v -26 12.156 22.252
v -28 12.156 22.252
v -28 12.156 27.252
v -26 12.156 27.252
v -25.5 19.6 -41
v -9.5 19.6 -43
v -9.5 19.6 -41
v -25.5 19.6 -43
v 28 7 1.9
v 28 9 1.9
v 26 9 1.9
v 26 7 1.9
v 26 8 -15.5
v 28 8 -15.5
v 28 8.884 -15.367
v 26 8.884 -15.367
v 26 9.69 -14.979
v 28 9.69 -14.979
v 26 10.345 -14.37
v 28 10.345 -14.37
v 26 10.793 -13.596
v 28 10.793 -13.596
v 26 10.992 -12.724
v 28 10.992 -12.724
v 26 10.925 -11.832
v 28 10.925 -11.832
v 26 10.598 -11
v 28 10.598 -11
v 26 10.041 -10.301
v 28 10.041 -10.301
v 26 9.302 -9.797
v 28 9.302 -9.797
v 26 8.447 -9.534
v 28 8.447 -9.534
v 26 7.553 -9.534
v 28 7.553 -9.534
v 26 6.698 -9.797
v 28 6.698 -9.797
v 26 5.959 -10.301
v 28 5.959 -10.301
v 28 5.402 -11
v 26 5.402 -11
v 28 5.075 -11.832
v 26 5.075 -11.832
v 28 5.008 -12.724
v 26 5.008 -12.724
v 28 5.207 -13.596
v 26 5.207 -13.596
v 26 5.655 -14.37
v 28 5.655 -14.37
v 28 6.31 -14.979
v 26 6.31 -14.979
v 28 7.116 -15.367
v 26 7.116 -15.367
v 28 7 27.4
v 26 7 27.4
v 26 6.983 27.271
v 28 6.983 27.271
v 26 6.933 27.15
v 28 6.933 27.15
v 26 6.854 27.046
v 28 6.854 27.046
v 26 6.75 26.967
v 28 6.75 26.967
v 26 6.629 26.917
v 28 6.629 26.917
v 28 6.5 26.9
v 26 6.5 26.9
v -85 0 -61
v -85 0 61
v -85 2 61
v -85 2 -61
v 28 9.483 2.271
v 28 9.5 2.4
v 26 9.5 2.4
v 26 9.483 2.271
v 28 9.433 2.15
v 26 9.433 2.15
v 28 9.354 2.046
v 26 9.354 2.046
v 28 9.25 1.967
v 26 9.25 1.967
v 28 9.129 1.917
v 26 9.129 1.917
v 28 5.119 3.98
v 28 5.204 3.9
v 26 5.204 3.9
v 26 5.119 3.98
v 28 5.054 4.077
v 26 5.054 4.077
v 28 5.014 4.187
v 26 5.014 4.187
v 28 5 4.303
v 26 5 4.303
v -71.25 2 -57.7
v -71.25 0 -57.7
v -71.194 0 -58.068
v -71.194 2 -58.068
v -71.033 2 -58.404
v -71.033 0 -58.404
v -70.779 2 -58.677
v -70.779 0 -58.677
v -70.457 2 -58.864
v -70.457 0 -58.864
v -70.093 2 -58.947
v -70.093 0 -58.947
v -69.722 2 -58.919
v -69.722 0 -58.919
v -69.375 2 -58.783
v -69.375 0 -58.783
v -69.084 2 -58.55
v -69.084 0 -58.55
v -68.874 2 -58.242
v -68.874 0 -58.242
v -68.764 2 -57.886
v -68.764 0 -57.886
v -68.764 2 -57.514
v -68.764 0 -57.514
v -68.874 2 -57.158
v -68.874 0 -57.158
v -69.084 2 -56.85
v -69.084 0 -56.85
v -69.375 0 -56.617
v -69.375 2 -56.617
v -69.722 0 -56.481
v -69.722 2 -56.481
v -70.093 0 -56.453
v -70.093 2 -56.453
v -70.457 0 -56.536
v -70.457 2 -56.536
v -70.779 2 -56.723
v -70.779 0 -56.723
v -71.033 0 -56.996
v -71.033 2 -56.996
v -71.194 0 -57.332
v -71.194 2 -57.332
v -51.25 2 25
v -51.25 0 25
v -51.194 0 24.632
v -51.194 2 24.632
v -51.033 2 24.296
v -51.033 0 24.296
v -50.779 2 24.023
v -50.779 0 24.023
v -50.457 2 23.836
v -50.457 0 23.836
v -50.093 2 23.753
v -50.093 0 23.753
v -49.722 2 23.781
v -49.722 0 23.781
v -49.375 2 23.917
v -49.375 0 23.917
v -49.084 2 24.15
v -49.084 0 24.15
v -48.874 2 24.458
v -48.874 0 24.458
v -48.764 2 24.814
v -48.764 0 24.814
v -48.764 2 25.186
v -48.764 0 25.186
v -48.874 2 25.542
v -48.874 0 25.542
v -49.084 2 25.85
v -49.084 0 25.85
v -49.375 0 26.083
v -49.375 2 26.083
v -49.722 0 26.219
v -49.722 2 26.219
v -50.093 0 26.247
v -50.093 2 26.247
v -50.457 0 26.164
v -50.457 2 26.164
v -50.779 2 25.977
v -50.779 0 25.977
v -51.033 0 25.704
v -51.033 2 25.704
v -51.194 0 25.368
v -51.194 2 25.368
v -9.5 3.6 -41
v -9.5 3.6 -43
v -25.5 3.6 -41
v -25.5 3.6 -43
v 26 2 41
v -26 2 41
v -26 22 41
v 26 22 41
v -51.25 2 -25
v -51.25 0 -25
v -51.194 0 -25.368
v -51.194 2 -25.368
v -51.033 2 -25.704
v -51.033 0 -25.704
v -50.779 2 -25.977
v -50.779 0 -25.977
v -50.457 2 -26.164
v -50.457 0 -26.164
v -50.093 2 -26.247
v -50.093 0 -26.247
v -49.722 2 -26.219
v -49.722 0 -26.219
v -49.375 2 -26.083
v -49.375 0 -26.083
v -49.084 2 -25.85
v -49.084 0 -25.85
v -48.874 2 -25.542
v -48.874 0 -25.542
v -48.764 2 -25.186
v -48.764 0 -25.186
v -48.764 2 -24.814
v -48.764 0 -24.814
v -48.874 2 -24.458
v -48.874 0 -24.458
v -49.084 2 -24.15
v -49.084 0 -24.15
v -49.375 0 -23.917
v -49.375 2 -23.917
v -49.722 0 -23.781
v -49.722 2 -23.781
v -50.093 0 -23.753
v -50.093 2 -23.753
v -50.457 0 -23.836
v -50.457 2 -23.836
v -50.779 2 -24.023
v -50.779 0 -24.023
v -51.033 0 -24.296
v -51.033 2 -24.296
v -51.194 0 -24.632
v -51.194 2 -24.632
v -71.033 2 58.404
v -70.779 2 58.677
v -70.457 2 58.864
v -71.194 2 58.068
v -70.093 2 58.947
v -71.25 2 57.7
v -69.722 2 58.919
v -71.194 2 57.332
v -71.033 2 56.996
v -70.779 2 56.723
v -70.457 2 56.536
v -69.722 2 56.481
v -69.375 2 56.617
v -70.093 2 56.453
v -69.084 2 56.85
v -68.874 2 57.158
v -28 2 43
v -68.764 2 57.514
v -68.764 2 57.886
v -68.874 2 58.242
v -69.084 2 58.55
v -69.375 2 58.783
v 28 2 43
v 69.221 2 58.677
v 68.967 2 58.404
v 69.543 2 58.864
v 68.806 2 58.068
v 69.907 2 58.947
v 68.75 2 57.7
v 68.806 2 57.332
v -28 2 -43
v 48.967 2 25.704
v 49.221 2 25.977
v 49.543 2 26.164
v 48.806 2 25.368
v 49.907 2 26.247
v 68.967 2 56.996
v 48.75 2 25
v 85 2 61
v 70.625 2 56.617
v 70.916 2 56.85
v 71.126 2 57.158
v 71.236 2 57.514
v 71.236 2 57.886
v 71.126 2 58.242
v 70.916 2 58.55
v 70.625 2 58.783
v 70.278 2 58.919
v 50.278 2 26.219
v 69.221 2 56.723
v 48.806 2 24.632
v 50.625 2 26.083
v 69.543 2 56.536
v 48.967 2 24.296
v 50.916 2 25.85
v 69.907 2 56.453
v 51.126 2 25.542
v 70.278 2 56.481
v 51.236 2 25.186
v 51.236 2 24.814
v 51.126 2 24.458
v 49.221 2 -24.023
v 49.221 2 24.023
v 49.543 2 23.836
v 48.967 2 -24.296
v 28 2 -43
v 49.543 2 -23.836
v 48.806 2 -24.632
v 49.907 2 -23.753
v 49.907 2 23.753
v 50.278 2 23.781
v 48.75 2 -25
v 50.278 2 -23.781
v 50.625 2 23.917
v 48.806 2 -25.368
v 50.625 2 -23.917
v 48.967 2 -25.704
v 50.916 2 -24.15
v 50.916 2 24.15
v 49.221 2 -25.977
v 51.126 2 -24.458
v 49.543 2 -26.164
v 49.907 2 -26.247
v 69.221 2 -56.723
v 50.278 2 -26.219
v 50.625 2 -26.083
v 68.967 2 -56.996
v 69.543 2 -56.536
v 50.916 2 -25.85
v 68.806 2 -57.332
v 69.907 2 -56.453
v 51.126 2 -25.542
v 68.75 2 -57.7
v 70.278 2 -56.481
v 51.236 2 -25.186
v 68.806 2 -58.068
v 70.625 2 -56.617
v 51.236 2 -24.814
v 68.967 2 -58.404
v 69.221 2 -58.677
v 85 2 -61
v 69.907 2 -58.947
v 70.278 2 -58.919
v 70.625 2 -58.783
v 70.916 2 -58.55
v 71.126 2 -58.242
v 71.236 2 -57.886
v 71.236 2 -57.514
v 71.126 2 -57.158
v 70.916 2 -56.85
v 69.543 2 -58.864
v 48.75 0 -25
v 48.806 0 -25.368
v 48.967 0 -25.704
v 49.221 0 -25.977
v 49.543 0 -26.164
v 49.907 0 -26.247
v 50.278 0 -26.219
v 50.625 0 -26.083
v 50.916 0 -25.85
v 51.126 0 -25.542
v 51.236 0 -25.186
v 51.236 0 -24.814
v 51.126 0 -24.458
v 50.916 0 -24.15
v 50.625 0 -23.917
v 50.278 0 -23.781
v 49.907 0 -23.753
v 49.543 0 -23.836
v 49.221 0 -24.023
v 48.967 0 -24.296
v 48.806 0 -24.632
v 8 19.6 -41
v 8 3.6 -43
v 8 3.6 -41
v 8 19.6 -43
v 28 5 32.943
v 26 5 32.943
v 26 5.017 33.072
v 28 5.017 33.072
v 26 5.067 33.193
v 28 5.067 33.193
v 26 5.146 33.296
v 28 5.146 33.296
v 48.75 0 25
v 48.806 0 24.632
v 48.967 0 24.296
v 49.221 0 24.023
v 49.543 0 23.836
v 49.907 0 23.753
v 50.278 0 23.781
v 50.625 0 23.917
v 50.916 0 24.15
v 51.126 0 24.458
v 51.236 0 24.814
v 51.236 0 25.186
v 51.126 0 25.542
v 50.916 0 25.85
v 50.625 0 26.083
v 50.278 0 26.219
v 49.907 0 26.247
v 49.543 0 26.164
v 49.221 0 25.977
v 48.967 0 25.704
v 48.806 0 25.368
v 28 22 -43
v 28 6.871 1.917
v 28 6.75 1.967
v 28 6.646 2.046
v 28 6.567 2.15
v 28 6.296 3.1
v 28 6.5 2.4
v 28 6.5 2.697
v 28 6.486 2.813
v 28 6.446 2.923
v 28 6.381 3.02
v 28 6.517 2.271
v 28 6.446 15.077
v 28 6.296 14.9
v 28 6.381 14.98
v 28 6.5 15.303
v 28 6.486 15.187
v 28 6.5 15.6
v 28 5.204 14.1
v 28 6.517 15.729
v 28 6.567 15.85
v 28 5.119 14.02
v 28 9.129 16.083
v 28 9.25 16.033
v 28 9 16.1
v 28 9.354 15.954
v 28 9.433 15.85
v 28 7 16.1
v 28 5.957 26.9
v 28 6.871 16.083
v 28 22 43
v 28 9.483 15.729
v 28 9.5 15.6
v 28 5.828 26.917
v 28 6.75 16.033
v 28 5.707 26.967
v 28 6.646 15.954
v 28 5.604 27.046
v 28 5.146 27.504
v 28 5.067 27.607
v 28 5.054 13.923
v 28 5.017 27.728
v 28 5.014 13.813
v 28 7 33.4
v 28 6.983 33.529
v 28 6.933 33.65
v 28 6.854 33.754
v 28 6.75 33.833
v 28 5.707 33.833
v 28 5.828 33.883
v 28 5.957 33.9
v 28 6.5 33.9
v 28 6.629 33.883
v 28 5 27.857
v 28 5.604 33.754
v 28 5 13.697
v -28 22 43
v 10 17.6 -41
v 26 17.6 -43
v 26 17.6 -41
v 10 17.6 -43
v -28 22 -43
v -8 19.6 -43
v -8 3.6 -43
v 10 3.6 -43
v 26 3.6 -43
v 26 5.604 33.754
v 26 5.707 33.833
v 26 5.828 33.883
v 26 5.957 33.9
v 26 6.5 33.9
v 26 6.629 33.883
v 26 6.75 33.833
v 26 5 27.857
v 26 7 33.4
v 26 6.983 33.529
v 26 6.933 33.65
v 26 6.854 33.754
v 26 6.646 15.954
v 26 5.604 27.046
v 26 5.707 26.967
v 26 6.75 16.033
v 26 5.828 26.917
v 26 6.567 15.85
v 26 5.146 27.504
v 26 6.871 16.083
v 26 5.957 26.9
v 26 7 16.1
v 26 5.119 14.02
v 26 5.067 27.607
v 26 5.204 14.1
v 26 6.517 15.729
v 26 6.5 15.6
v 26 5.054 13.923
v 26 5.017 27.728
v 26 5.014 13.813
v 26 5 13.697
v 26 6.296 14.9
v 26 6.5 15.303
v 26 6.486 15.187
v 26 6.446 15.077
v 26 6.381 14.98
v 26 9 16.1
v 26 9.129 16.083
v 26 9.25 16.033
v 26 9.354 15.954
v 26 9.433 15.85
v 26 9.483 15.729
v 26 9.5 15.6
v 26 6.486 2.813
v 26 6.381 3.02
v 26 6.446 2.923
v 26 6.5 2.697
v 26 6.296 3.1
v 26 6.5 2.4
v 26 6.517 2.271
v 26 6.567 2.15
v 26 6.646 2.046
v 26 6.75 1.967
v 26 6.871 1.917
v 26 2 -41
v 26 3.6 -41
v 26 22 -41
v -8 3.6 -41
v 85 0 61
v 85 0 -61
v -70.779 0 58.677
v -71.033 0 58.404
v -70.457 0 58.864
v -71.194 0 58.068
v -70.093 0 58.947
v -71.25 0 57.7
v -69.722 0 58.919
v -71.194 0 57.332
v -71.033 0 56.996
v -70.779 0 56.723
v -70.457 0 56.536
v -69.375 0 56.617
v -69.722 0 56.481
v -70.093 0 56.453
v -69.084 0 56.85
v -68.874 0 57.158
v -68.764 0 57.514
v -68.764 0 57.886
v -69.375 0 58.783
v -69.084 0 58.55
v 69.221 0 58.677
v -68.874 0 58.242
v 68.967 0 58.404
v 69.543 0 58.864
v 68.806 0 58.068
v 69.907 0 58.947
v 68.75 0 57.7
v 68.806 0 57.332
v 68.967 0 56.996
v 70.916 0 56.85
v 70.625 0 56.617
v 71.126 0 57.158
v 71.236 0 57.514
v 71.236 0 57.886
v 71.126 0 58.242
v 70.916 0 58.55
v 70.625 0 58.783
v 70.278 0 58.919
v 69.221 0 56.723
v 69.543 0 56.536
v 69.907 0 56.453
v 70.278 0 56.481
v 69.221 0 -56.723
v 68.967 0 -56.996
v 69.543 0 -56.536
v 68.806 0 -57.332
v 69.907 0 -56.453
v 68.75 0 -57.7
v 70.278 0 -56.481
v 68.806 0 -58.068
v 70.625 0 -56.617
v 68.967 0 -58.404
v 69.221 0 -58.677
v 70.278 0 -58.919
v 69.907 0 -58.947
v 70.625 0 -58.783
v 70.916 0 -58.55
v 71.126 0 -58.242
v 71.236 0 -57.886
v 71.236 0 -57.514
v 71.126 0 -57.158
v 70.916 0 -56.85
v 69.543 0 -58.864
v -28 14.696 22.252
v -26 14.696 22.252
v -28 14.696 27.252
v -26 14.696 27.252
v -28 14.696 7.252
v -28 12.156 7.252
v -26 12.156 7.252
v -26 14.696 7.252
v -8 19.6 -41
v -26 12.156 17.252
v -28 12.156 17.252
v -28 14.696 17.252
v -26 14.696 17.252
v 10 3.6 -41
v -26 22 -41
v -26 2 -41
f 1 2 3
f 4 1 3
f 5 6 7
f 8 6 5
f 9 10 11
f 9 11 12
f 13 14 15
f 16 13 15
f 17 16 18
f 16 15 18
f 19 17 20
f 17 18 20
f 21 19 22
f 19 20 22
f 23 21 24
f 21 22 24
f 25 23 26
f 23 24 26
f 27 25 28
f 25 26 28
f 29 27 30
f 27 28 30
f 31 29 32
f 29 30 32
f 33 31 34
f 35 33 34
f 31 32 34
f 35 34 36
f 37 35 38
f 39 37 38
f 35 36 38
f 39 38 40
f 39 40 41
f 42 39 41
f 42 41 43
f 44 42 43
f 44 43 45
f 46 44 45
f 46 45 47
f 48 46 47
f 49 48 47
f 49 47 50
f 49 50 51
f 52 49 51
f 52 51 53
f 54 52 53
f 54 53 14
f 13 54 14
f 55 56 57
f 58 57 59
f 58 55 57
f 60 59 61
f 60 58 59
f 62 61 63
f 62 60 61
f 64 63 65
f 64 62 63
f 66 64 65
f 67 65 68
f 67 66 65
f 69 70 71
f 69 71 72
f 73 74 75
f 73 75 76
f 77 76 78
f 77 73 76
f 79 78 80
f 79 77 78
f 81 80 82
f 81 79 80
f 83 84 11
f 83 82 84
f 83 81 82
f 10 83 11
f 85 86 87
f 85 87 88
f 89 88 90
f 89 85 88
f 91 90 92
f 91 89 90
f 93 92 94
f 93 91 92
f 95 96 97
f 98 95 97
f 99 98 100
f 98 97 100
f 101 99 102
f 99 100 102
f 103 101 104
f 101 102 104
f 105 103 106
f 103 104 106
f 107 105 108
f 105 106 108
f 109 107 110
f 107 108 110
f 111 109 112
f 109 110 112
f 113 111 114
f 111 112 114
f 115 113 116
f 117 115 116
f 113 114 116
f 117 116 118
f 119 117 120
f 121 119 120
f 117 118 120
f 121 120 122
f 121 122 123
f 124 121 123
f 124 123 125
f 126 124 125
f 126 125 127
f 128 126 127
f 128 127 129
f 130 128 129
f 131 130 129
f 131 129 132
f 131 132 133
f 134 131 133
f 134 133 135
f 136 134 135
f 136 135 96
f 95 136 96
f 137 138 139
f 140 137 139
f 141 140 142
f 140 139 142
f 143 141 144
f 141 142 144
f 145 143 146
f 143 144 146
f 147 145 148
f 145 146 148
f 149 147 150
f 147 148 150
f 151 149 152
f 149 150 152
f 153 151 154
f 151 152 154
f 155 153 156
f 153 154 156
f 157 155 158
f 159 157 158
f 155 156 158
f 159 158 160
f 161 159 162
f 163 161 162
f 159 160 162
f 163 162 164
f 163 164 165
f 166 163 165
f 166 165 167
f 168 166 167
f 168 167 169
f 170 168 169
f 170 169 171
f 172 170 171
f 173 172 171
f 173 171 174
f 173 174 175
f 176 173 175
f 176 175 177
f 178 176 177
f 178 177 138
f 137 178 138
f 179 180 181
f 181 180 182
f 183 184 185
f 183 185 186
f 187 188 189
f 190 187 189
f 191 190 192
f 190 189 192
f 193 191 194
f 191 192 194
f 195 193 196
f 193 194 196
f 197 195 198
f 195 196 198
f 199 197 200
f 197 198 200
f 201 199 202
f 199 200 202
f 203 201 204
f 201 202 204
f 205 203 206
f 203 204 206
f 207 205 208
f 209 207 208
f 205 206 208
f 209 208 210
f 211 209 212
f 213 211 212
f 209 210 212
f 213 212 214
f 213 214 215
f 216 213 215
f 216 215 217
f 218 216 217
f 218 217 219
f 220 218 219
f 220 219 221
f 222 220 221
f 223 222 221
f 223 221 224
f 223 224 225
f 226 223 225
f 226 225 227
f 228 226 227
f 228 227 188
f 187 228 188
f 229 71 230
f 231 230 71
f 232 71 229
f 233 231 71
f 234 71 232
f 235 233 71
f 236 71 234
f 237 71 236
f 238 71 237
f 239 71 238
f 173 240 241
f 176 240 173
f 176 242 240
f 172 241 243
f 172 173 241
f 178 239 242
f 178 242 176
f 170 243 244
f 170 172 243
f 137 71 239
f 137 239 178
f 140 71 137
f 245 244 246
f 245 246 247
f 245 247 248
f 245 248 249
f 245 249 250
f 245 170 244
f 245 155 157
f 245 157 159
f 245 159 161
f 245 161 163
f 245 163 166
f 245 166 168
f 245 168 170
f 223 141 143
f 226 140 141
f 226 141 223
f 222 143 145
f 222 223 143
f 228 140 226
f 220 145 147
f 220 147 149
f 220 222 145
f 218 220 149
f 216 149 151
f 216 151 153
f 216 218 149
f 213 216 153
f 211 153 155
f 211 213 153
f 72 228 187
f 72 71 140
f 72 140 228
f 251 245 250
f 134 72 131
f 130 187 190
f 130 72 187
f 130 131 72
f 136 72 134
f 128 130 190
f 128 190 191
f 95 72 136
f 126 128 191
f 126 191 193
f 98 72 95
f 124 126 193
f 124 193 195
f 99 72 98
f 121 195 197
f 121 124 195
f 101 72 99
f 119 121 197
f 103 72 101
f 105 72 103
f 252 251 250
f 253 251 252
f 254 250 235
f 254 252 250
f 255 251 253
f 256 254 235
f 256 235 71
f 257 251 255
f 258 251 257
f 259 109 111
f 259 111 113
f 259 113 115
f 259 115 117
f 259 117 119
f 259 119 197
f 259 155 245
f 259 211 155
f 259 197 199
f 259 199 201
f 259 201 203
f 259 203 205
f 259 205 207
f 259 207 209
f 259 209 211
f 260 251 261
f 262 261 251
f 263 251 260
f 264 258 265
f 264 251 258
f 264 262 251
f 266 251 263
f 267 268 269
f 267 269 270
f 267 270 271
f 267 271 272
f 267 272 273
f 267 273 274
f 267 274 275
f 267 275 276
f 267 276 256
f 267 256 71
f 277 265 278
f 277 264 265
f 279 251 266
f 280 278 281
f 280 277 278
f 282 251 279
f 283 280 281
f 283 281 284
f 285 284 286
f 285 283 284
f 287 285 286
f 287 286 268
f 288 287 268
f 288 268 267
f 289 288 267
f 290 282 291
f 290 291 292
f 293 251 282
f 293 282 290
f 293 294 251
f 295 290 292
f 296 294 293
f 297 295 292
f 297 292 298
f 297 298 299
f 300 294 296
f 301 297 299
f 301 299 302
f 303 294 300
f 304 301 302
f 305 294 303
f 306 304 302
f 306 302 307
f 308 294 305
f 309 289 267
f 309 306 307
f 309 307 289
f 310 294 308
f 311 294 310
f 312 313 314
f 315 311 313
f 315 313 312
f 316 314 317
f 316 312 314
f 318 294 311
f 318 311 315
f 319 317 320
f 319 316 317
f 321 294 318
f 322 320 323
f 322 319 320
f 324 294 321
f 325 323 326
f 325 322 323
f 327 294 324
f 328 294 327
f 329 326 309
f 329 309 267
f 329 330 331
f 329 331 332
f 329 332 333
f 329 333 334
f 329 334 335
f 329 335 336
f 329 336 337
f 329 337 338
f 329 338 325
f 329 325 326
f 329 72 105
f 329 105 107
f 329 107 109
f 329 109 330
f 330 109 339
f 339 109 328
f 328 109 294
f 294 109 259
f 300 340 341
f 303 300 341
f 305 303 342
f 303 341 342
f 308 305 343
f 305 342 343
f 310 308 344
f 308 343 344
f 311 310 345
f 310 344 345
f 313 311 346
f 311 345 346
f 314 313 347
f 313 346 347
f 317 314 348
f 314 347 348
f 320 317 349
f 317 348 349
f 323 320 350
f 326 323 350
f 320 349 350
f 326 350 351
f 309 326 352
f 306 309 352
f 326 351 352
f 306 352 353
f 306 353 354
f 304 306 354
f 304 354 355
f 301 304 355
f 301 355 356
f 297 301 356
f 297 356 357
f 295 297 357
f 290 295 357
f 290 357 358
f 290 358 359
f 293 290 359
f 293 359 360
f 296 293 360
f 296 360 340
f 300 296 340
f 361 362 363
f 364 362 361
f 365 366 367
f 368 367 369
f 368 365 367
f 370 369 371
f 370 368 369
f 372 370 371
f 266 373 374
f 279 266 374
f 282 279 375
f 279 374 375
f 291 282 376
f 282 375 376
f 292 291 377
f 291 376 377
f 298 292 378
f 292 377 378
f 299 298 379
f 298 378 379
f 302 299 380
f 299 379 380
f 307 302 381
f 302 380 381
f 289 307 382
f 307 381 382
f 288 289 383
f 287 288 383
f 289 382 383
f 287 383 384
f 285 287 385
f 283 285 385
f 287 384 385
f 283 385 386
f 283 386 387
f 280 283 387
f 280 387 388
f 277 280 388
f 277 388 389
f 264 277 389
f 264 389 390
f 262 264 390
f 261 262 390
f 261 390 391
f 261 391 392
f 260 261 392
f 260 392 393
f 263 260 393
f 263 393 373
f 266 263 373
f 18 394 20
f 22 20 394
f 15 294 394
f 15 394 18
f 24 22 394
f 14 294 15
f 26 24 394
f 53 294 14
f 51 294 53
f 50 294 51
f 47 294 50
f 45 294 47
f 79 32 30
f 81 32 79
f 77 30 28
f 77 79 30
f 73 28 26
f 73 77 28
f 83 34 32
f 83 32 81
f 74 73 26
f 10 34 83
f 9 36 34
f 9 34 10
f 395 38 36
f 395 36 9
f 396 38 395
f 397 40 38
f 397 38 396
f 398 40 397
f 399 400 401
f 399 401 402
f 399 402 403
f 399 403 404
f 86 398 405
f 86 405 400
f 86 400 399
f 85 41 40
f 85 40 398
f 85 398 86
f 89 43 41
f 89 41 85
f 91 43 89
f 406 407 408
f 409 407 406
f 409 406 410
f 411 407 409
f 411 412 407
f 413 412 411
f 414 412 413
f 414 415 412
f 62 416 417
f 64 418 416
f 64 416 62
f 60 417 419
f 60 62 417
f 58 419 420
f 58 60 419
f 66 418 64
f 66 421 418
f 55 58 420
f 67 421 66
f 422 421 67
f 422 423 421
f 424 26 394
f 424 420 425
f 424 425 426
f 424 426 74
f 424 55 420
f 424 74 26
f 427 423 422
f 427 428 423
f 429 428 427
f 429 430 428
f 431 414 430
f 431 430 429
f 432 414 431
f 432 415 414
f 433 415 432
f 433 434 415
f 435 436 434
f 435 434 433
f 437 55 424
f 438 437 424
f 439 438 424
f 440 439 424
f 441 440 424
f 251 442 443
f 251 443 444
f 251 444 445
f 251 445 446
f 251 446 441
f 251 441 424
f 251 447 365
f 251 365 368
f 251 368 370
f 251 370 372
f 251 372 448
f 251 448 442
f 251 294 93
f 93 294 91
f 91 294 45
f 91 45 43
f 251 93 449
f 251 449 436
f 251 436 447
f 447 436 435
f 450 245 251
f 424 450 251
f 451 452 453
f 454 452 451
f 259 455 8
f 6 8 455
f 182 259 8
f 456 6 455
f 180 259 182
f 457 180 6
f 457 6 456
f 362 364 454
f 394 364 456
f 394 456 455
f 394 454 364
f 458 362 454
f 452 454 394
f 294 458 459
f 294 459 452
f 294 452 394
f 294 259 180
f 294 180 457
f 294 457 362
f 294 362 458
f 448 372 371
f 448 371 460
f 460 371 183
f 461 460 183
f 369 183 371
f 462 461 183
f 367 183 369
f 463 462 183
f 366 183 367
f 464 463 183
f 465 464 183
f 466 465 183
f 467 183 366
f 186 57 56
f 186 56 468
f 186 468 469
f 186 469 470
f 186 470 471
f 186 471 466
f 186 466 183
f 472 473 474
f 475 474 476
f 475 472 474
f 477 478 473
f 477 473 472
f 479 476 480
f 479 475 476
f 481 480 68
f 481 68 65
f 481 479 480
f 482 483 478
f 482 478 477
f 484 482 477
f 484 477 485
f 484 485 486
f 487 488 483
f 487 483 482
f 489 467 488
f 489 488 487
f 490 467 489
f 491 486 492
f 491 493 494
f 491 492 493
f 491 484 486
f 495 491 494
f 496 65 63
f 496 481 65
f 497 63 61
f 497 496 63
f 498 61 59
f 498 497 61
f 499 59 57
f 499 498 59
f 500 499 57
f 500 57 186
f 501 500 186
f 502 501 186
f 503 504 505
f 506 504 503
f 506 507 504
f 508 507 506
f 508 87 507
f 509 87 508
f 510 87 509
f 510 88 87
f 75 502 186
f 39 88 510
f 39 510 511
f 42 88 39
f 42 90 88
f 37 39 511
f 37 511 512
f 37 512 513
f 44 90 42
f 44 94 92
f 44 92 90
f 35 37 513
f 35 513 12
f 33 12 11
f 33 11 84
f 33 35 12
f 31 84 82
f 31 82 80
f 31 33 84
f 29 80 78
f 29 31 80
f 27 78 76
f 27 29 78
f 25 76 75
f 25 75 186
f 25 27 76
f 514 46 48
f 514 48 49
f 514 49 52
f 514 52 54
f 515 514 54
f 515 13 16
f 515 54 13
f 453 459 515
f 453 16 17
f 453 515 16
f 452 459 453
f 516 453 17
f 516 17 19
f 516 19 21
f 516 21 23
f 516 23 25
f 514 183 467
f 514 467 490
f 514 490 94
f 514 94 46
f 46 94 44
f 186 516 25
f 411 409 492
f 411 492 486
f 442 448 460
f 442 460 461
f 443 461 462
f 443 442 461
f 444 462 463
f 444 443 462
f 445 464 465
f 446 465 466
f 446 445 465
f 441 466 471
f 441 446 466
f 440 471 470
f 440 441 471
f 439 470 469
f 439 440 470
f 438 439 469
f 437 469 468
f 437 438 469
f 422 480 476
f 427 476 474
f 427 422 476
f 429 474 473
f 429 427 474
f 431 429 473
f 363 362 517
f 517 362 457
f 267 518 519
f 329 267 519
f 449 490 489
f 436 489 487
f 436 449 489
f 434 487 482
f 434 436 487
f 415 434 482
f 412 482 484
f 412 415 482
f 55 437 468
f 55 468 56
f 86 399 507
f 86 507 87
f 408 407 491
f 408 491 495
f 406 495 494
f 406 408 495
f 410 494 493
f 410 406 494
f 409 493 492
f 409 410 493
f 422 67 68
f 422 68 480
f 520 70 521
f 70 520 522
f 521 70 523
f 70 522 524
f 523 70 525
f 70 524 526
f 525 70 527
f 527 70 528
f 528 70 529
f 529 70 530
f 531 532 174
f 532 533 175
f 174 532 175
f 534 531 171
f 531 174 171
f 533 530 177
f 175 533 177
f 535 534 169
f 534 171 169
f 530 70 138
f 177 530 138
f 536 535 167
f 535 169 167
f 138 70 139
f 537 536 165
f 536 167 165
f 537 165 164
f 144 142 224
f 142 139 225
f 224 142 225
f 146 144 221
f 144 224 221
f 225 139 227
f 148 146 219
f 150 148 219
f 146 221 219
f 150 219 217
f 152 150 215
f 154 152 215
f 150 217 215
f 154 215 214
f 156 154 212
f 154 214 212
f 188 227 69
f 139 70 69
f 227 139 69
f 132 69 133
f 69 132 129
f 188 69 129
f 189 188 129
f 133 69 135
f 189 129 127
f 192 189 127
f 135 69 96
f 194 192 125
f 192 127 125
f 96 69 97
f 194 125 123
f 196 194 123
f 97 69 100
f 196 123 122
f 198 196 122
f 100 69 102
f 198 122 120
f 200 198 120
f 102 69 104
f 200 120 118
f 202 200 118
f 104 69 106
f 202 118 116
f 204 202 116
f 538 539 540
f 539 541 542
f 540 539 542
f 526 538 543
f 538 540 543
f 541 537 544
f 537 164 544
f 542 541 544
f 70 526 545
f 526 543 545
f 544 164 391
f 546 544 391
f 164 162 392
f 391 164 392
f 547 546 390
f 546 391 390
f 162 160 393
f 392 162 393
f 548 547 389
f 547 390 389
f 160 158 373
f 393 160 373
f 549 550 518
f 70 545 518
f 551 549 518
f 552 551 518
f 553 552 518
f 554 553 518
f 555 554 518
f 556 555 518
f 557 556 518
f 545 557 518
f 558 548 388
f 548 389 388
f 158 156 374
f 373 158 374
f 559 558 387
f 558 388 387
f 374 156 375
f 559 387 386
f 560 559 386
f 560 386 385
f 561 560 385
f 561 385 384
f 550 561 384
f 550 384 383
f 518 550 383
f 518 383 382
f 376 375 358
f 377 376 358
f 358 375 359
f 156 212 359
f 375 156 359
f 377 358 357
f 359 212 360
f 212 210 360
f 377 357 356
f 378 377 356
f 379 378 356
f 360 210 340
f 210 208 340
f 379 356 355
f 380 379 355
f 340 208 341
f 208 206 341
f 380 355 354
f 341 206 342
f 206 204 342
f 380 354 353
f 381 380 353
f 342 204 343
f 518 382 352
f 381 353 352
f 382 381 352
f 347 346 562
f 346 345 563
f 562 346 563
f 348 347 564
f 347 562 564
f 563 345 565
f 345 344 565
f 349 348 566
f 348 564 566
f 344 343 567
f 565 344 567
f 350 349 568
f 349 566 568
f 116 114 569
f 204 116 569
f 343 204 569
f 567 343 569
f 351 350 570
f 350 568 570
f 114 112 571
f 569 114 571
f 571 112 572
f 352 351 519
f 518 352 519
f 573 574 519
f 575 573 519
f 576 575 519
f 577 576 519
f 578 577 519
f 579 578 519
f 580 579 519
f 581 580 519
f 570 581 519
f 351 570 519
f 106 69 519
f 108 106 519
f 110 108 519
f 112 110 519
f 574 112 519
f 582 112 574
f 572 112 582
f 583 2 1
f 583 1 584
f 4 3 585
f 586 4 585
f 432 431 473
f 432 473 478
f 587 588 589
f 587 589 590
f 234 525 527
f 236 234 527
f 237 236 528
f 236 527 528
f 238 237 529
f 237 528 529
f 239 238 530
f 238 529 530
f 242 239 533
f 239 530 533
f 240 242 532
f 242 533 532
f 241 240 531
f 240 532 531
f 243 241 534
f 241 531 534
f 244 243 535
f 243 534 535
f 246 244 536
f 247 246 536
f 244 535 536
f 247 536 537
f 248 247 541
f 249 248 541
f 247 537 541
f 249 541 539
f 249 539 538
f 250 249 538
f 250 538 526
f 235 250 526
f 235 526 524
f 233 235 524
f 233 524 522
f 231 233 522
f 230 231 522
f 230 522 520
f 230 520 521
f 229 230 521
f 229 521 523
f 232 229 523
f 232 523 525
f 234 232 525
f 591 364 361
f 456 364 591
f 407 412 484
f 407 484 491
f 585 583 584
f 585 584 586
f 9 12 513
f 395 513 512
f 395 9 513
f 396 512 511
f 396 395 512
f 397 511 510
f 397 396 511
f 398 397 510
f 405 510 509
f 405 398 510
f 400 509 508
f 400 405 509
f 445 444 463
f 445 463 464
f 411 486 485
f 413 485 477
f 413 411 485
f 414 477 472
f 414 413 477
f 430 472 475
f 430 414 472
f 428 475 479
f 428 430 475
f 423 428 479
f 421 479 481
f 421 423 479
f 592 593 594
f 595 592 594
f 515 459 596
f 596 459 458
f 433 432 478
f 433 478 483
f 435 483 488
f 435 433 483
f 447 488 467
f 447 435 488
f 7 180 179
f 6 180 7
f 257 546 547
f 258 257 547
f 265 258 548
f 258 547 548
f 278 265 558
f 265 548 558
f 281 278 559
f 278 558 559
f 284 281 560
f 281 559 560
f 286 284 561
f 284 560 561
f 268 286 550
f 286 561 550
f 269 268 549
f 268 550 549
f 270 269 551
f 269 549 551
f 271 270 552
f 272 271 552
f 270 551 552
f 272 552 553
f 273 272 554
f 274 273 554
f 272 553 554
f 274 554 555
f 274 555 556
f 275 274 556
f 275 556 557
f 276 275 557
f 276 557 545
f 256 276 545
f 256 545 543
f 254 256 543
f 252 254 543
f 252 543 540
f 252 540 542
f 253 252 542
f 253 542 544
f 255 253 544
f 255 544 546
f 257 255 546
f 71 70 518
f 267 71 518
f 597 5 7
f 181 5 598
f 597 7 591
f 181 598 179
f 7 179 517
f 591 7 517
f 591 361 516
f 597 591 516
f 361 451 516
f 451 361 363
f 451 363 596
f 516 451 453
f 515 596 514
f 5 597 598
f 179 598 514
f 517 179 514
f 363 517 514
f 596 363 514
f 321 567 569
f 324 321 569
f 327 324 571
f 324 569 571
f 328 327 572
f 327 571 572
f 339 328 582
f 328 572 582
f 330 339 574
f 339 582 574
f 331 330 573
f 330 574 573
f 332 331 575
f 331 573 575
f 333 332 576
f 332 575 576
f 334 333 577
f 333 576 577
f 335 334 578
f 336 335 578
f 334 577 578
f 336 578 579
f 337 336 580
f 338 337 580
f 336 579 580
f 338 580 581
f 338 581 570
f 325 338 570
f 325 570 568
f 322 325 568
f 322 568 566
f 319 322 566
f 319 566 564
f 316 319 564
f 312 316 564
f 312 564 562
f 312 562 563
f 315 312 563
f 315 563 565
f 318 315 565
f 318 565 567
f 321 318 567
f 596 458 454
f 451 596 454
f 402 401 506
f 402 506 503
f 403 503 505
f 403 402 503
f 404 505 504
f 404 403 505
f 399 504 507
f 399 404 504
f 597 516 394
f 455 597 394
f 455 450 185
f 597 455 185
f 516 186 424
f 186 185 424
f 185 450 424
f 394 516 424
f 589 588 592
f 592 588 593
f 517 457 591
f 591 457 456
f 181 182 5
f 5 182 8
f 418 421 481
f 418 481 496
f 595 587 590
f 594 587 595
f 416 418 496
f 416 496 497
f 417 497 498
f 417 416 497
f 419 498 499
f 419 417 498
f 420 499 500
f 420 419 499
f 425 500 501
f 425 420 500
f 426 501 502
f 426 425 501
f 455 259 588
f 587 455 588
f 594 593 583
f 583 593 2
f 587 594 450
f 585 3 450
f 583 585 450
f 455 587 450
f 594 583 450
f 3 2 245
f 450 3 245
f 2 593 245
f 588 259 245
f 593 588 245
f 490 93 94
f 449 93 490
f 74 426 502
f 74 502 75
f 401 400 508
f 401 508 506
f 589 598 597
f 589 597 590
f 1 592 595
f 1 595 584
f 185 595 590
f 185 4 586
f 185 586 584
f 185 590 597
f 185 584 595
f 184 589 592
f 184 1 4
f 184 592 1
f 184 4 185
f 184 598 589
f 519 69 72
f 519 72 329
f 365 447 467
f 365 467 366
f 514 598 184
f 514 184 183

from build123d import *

# Parameters (mm, degrees)
ESQUISSE1_W                               = 170
ESQUISSE1_H                               = 122
BOSS_EXTRU_1_DEPTH                        = 2
TROU_POUR_TARAUDAGE_POUR_TROU_TARAUD_M3_D = 2.5
ESQUISSE4_W                               = 56
ESQUISSE4_H                               = 86
BOSS_EXTRU_2_DEPTH                        = 20
COQUE1_T                                  = -2
ENL_V_MAT_EXTRU_1_REACH                   = 132.284
ESQUISSE5_R                               = 3
ENL_V_MAT_EXTRU_2_REACH                   = 138.107
ESQUISSE6_W                               = 16
ESQUISSE6_H                               = 16
ESQUISSE6_H_2                             = 14
ENL_V_MAT_EXTRU_3_REACH                   = 132.284
ESQUISSE7_W                               = 10
ESQUISSE7_H                               = 2.54
ESQUISSE7_W_2                             = 5


with BuildPart() as part:
    # Esquisse1 → Boss.-Extru.1 (new body)
    with BuildSketch(Plane(origin=(0, 0, 0), x_dir=(1, 0, 0), z_dir=(0, 1, 0))):
        Rectangle(ESQUISSE1_W, ESQUISSE1_H)
    extrude(amount=BOSS_EXTRU_1_DEPTH)

    # Trou pour taraudage pour trou taraudé M3x0.51 (through all)
    with Locations(Plane(origin=(0, 2, 0), x_dir=(1, 0, 0), z_dir=(0, 1, 0))):
        with Locations((-50, 25), (50, 25), (50, -25), (-50, -25), (70, 57.7), (-70, -57.7), (-70, 57.7), (70, -57.7)):
            Hole(TROU_POUR_TARAUDAGE_POUR_TROU_TARAUD_M3_D / 2)

    # Esquisse4 → Boss.-Extru.2 (add)
    with BuildSketch(Plane.XZ.offset(-2)):
        Rectangle(ESQUISSE4_W, ESQUISSE4_H)
    extrude(amount=-BOSS_EXTRU_2_DEPTH)

    # Coque1
    coque1_openings = [part.faces().sort_by_distance(p)[0] for p in [
        (0, 22, 0),
    ]]
    offset(amount=COQUE1_T, openings=coque1_openings, kind=Kind.INTERSECTION)

    # Esquisse5 → Enlèv. mat.-Extru.1 (cut, up to next)
    with BuildSketch(Plane(origin=(28, 0, 0), x_dir=(0, 0, -1), z_dir=(1, 0, 0)), mode=Mode.PRIVATE) as enl_v_mat_extru_1_sk1:
        with Locations((12.5, 8)):
            Circle(ESQUISSE5_R)
    enl_v_mat_extru_1_tool1 = extrude(enl_v_mat_extru_1_sk1.sketch, amount=-ENL_V_MAT_EXTRU_1_REACH, mode=Mode.PRIVATE) & part.part
    # Esquisse5 → Enlèv. mat.-Extru.1 (cut, up to next)
    with BuildSketch(Plane(origin=(28, 0, 0), x_dir=(0, 0, -1), z_dir=(1, 0, 0)), mode=Mode.PRIVATE) as enl_v_mat_extru_1_sk2:
        with BuildLine():
            Line((-33.4, 7), (-27.4, 7))
            ThreePointArc((-27.4, 7), (-27.046446609, 6.853553391), (-26.9, 6.5))
            Line((-26.9, 6.5), (-26.9, 5.957106781))
            ThreePointArc((-26.9, 5.957106781), (-26.938060234, 5.765765065), (-27.046446609, 5.603553391))
            Line((-27.046446609, 5.603553391), (-27.503553391, 5.146446609))
            ThreePointArc((-27.503553391, 5.146446609), (-27.665765065, 5.038060234), (-27.857106781, 5))
            Line((-27.857106781, 5), (-32.942893219, 5))
            ThreePointArc((-32.942893219, 5), (-33.134234935, 5.038060234), (-33.296446609, 5.146446609))
            Line((-33.296446609, 5.146446609), (-33.753553391, 5.603553391))
            ThreePointArc((-33.753553391, 5.603553391), (-33.861939766, 5.765765065), (-33.9, 5.957106781))
            Line((-33.9, 5.957106781), (-33.9, 6.5))
            ThreePointArc((-33.9, 6.5), (-33.753553391, 6.853553391), (-33.4, 7))
        make_face()
    enl_v_mat_extru_1_tool2 = extrude(enl_v_mat_extru_1_sk2.sketch, amount=-ENL_V_MAT_EXTRU_1_REACH, mode=Mode.PRIVATE) & part.part
    # Esquisse5 → Enlèv. mat.-Extru.1 (cut, up to next)
    with BuildSketch(Plane(origin=(28, 0, 0), x_dir=(0, 0, -1), z_dir=(1, 0, 0)), mode=Mode.PRIVATE) as enl_v_mat_extru_1_sk3:
        with BuildLine():
            Line((-15.6, 9.5), (-2.4, 9.5))
            ThreePointArc((-2.4, 9.5), (-2.046446609, 9.353553391), (-1.9, 9))
            Line((-1.9, 9), (-1.9, 7))
            ThreePointArc((-1.9, 7), (-2.046446609, 6.646446609), (-2.4, 6.5))
            Line((-2.4, 6.5), (-2.696630825, 6.5))
            ThreePointArc((-2.696630825, 6.5), (-2.922638662, 6.446004998), (-3.099833323, 6.295681832))
            Line((-3.099833323, 6.295681832), (-3.900166677, 5.204318168))
            ThreePointArc((-3.900166677, 5.204318168), (-4.077361338, 5.053995002), (-4.303369175, 5))
            Line((-4.303369175, 5), (-13.696630825, 5))
            ThreePointArc((-13.696630825, 5), (-13.922638662, 5.053995002), (-14.099833323, 5.204318168))
            Line((-14.099833323, 5.204318168), (-14.900166677, 6.295681832))
            ThreePointArc((-14.900166677, 6.295681832), (-15.077361338, 6.446004998), (-15.303369175, 6.5))
            Line((-15.303369175, 6.5), (-15.6, 6.5))
            ThreePointArc((-15.6, 6.5), (-15.953553391, 6.646446609), (-16.1, 7))
            Line((-16.1, 7), (-16.1, 9))
            ThreePointArc((-16.1, 9), (-15.953553391, 9.353553391), (-15.6, 9.5))
        make_face()
    enl_v_mat_extru_1_tool3 = extrude(enl_v_mat_extru_1_sk3.sketch, amount=-ENL_V_MAT_EXTRU_1_REACH, mode=Mode.PRIVATE) & part.part
    add(enl_v_mat_extru_1_tool1.solids().sort_by_distance((28, 8, -12.5))[0], mode=Mode.SUBTRACT)
    add(enl_v_mat_extru_1_tool2.solids().sort_by_distance((28, 6.025513, 30.4))[0], mode=Mode.SUBTRACT)
    add(enl_v_mat_extru_1_tool3.solids().sort_by_distance((28, 7.376996, 9))[0], mode=Mode.SUBTRACT)

    # Esquisse6 → Enlèv. mat.-Extru.2 (cut, up to next)
    with BuildSketch(Plane(origin=(0, 0, -43), x_dir=(-1, 0, 0), z_dir=(0, 0, -1)), mode=Mode.PRIVATE) as enl_v_mat_extru_2_sk1:
        with Locations((17.5, 11.6)):
            Rectangle(ESQUISSE6_W, ESQUISSE6_H)
    enl_v_mat_extru_2_tool1 = extrude(enl_v_mat_extru_2_sk1.sketch, amount=-ENL_V_MAT_EXTRU_2_REACH, mode=Mode.PRIVATE) & part.part
    # Esquisse6 → Enlèv. mat.-Extru.2 (cut, up to next)
    with BuildSketch(Plane(origin=(0, 0, -43), x_dir=(-1, 0, 0), z_dir=(0, 0, -1)), mode=Mode.PRIVATE) as enl_v_mat_extru_2_sk2:
        with Locations((0, 11.6)):
            Rectangle(ESQUISSE6_W, ESQUISSE6_H)
    enl_v_mat_extru_2_tool2 = extrude(enl_v_mat_extru_2_sk2.sketch, amount=-ENL_V_MAT_EXTRU_2_REACH, mode=Mode.PRIVATE) & part.part
    # Esquisse6 → Enlèv. mat.-Extru.2 (cut, up to next)
    with BuildSketch(Plane(origin=(0, 0, -43), x_dir=(-1, 0, 0), z_dir=(0, 0, -1)), mode=Mode.PRIVATE) as enl_v_mat_extru_2_sk3:
        with Locations((-18, 10.6)):
            Rectangle(ESQUISSE6_W, ESQUISSE6_H_2)
    enl_v_mat_extru_2_tool3 = extrude(enl_v_mat_extru_2_sk3.sketch, amount=-ENL_V_MAT_EXTRU_2_REACH, mode=Mode.PRIVATE) & part.part
    add(enl_v_mat_extru_2_tool1.solids().sort_by_distance((-17.5, 11.6, -43))[0], mode=Mode.SUBTRACT)
    add(enl_v_mat_extru_2_tool2.solids().sort_by_distance((0, 11.6, -43))[0], mode=Mode.SUBTRACT)
    add(enl_v_mat_extru_2_tool3.solids().sort_by_distance((18, 10.6, -43))[0], mode=Mode.SUBTRACT)

    # Esquisse7 → Enlèv. mat.-Extru.3 (cut, up to next)
    with BuildSketch(Plane.ZY.offset(28), mode=Mode.PRIVATE) as enl_v_mat_extru_3_sk1:
        with Locations((12.251607125, 13.425584158)):
            Rectangle(ESQUISSE7_W, ESQUISSE7_H)
    enl_v_mat_extru_3_tool1 = extrude(enl_v_mat_extru_3_sk1.sketch, amount=-ENL_V_MAT_EXTRU_3_REACH, mode=Mode.PRIVATE) & part.part
    # Esquisse7 → Enlèv. mat.-Extru.3 (cut, up to next)
    with BuildSketch(Plane.ZY.offset(28), mode=Mode.PRIVATE) as enl_v_mat_extru_3_sk2:
        with Locations((24.751607125, 13.425584158)):
            Rectangle(ESQUISSE7_W_2, ESQUISSE7_H)
    enl_v_mat_extru_3_tool2 = extrude(enl_v_mat_extru_3_sk2.sketch, amount=-ENL_V_MAT_EXTRU_3_REACH, mode=Mode.PRIVATE) & part.part
    add(enl_v_mat_extru_3_tool1.solids().sort_by_distance((-28, 13.425584, 12.251607))[0], mode=Mode.SUBTRACT)
    add(enl_v_mat_extru_3_tool2.solids().sort_by_distance((-28, 13.425584, 24.751607))[0], mode=Mode.SUBTRACT)


solid = part.part
